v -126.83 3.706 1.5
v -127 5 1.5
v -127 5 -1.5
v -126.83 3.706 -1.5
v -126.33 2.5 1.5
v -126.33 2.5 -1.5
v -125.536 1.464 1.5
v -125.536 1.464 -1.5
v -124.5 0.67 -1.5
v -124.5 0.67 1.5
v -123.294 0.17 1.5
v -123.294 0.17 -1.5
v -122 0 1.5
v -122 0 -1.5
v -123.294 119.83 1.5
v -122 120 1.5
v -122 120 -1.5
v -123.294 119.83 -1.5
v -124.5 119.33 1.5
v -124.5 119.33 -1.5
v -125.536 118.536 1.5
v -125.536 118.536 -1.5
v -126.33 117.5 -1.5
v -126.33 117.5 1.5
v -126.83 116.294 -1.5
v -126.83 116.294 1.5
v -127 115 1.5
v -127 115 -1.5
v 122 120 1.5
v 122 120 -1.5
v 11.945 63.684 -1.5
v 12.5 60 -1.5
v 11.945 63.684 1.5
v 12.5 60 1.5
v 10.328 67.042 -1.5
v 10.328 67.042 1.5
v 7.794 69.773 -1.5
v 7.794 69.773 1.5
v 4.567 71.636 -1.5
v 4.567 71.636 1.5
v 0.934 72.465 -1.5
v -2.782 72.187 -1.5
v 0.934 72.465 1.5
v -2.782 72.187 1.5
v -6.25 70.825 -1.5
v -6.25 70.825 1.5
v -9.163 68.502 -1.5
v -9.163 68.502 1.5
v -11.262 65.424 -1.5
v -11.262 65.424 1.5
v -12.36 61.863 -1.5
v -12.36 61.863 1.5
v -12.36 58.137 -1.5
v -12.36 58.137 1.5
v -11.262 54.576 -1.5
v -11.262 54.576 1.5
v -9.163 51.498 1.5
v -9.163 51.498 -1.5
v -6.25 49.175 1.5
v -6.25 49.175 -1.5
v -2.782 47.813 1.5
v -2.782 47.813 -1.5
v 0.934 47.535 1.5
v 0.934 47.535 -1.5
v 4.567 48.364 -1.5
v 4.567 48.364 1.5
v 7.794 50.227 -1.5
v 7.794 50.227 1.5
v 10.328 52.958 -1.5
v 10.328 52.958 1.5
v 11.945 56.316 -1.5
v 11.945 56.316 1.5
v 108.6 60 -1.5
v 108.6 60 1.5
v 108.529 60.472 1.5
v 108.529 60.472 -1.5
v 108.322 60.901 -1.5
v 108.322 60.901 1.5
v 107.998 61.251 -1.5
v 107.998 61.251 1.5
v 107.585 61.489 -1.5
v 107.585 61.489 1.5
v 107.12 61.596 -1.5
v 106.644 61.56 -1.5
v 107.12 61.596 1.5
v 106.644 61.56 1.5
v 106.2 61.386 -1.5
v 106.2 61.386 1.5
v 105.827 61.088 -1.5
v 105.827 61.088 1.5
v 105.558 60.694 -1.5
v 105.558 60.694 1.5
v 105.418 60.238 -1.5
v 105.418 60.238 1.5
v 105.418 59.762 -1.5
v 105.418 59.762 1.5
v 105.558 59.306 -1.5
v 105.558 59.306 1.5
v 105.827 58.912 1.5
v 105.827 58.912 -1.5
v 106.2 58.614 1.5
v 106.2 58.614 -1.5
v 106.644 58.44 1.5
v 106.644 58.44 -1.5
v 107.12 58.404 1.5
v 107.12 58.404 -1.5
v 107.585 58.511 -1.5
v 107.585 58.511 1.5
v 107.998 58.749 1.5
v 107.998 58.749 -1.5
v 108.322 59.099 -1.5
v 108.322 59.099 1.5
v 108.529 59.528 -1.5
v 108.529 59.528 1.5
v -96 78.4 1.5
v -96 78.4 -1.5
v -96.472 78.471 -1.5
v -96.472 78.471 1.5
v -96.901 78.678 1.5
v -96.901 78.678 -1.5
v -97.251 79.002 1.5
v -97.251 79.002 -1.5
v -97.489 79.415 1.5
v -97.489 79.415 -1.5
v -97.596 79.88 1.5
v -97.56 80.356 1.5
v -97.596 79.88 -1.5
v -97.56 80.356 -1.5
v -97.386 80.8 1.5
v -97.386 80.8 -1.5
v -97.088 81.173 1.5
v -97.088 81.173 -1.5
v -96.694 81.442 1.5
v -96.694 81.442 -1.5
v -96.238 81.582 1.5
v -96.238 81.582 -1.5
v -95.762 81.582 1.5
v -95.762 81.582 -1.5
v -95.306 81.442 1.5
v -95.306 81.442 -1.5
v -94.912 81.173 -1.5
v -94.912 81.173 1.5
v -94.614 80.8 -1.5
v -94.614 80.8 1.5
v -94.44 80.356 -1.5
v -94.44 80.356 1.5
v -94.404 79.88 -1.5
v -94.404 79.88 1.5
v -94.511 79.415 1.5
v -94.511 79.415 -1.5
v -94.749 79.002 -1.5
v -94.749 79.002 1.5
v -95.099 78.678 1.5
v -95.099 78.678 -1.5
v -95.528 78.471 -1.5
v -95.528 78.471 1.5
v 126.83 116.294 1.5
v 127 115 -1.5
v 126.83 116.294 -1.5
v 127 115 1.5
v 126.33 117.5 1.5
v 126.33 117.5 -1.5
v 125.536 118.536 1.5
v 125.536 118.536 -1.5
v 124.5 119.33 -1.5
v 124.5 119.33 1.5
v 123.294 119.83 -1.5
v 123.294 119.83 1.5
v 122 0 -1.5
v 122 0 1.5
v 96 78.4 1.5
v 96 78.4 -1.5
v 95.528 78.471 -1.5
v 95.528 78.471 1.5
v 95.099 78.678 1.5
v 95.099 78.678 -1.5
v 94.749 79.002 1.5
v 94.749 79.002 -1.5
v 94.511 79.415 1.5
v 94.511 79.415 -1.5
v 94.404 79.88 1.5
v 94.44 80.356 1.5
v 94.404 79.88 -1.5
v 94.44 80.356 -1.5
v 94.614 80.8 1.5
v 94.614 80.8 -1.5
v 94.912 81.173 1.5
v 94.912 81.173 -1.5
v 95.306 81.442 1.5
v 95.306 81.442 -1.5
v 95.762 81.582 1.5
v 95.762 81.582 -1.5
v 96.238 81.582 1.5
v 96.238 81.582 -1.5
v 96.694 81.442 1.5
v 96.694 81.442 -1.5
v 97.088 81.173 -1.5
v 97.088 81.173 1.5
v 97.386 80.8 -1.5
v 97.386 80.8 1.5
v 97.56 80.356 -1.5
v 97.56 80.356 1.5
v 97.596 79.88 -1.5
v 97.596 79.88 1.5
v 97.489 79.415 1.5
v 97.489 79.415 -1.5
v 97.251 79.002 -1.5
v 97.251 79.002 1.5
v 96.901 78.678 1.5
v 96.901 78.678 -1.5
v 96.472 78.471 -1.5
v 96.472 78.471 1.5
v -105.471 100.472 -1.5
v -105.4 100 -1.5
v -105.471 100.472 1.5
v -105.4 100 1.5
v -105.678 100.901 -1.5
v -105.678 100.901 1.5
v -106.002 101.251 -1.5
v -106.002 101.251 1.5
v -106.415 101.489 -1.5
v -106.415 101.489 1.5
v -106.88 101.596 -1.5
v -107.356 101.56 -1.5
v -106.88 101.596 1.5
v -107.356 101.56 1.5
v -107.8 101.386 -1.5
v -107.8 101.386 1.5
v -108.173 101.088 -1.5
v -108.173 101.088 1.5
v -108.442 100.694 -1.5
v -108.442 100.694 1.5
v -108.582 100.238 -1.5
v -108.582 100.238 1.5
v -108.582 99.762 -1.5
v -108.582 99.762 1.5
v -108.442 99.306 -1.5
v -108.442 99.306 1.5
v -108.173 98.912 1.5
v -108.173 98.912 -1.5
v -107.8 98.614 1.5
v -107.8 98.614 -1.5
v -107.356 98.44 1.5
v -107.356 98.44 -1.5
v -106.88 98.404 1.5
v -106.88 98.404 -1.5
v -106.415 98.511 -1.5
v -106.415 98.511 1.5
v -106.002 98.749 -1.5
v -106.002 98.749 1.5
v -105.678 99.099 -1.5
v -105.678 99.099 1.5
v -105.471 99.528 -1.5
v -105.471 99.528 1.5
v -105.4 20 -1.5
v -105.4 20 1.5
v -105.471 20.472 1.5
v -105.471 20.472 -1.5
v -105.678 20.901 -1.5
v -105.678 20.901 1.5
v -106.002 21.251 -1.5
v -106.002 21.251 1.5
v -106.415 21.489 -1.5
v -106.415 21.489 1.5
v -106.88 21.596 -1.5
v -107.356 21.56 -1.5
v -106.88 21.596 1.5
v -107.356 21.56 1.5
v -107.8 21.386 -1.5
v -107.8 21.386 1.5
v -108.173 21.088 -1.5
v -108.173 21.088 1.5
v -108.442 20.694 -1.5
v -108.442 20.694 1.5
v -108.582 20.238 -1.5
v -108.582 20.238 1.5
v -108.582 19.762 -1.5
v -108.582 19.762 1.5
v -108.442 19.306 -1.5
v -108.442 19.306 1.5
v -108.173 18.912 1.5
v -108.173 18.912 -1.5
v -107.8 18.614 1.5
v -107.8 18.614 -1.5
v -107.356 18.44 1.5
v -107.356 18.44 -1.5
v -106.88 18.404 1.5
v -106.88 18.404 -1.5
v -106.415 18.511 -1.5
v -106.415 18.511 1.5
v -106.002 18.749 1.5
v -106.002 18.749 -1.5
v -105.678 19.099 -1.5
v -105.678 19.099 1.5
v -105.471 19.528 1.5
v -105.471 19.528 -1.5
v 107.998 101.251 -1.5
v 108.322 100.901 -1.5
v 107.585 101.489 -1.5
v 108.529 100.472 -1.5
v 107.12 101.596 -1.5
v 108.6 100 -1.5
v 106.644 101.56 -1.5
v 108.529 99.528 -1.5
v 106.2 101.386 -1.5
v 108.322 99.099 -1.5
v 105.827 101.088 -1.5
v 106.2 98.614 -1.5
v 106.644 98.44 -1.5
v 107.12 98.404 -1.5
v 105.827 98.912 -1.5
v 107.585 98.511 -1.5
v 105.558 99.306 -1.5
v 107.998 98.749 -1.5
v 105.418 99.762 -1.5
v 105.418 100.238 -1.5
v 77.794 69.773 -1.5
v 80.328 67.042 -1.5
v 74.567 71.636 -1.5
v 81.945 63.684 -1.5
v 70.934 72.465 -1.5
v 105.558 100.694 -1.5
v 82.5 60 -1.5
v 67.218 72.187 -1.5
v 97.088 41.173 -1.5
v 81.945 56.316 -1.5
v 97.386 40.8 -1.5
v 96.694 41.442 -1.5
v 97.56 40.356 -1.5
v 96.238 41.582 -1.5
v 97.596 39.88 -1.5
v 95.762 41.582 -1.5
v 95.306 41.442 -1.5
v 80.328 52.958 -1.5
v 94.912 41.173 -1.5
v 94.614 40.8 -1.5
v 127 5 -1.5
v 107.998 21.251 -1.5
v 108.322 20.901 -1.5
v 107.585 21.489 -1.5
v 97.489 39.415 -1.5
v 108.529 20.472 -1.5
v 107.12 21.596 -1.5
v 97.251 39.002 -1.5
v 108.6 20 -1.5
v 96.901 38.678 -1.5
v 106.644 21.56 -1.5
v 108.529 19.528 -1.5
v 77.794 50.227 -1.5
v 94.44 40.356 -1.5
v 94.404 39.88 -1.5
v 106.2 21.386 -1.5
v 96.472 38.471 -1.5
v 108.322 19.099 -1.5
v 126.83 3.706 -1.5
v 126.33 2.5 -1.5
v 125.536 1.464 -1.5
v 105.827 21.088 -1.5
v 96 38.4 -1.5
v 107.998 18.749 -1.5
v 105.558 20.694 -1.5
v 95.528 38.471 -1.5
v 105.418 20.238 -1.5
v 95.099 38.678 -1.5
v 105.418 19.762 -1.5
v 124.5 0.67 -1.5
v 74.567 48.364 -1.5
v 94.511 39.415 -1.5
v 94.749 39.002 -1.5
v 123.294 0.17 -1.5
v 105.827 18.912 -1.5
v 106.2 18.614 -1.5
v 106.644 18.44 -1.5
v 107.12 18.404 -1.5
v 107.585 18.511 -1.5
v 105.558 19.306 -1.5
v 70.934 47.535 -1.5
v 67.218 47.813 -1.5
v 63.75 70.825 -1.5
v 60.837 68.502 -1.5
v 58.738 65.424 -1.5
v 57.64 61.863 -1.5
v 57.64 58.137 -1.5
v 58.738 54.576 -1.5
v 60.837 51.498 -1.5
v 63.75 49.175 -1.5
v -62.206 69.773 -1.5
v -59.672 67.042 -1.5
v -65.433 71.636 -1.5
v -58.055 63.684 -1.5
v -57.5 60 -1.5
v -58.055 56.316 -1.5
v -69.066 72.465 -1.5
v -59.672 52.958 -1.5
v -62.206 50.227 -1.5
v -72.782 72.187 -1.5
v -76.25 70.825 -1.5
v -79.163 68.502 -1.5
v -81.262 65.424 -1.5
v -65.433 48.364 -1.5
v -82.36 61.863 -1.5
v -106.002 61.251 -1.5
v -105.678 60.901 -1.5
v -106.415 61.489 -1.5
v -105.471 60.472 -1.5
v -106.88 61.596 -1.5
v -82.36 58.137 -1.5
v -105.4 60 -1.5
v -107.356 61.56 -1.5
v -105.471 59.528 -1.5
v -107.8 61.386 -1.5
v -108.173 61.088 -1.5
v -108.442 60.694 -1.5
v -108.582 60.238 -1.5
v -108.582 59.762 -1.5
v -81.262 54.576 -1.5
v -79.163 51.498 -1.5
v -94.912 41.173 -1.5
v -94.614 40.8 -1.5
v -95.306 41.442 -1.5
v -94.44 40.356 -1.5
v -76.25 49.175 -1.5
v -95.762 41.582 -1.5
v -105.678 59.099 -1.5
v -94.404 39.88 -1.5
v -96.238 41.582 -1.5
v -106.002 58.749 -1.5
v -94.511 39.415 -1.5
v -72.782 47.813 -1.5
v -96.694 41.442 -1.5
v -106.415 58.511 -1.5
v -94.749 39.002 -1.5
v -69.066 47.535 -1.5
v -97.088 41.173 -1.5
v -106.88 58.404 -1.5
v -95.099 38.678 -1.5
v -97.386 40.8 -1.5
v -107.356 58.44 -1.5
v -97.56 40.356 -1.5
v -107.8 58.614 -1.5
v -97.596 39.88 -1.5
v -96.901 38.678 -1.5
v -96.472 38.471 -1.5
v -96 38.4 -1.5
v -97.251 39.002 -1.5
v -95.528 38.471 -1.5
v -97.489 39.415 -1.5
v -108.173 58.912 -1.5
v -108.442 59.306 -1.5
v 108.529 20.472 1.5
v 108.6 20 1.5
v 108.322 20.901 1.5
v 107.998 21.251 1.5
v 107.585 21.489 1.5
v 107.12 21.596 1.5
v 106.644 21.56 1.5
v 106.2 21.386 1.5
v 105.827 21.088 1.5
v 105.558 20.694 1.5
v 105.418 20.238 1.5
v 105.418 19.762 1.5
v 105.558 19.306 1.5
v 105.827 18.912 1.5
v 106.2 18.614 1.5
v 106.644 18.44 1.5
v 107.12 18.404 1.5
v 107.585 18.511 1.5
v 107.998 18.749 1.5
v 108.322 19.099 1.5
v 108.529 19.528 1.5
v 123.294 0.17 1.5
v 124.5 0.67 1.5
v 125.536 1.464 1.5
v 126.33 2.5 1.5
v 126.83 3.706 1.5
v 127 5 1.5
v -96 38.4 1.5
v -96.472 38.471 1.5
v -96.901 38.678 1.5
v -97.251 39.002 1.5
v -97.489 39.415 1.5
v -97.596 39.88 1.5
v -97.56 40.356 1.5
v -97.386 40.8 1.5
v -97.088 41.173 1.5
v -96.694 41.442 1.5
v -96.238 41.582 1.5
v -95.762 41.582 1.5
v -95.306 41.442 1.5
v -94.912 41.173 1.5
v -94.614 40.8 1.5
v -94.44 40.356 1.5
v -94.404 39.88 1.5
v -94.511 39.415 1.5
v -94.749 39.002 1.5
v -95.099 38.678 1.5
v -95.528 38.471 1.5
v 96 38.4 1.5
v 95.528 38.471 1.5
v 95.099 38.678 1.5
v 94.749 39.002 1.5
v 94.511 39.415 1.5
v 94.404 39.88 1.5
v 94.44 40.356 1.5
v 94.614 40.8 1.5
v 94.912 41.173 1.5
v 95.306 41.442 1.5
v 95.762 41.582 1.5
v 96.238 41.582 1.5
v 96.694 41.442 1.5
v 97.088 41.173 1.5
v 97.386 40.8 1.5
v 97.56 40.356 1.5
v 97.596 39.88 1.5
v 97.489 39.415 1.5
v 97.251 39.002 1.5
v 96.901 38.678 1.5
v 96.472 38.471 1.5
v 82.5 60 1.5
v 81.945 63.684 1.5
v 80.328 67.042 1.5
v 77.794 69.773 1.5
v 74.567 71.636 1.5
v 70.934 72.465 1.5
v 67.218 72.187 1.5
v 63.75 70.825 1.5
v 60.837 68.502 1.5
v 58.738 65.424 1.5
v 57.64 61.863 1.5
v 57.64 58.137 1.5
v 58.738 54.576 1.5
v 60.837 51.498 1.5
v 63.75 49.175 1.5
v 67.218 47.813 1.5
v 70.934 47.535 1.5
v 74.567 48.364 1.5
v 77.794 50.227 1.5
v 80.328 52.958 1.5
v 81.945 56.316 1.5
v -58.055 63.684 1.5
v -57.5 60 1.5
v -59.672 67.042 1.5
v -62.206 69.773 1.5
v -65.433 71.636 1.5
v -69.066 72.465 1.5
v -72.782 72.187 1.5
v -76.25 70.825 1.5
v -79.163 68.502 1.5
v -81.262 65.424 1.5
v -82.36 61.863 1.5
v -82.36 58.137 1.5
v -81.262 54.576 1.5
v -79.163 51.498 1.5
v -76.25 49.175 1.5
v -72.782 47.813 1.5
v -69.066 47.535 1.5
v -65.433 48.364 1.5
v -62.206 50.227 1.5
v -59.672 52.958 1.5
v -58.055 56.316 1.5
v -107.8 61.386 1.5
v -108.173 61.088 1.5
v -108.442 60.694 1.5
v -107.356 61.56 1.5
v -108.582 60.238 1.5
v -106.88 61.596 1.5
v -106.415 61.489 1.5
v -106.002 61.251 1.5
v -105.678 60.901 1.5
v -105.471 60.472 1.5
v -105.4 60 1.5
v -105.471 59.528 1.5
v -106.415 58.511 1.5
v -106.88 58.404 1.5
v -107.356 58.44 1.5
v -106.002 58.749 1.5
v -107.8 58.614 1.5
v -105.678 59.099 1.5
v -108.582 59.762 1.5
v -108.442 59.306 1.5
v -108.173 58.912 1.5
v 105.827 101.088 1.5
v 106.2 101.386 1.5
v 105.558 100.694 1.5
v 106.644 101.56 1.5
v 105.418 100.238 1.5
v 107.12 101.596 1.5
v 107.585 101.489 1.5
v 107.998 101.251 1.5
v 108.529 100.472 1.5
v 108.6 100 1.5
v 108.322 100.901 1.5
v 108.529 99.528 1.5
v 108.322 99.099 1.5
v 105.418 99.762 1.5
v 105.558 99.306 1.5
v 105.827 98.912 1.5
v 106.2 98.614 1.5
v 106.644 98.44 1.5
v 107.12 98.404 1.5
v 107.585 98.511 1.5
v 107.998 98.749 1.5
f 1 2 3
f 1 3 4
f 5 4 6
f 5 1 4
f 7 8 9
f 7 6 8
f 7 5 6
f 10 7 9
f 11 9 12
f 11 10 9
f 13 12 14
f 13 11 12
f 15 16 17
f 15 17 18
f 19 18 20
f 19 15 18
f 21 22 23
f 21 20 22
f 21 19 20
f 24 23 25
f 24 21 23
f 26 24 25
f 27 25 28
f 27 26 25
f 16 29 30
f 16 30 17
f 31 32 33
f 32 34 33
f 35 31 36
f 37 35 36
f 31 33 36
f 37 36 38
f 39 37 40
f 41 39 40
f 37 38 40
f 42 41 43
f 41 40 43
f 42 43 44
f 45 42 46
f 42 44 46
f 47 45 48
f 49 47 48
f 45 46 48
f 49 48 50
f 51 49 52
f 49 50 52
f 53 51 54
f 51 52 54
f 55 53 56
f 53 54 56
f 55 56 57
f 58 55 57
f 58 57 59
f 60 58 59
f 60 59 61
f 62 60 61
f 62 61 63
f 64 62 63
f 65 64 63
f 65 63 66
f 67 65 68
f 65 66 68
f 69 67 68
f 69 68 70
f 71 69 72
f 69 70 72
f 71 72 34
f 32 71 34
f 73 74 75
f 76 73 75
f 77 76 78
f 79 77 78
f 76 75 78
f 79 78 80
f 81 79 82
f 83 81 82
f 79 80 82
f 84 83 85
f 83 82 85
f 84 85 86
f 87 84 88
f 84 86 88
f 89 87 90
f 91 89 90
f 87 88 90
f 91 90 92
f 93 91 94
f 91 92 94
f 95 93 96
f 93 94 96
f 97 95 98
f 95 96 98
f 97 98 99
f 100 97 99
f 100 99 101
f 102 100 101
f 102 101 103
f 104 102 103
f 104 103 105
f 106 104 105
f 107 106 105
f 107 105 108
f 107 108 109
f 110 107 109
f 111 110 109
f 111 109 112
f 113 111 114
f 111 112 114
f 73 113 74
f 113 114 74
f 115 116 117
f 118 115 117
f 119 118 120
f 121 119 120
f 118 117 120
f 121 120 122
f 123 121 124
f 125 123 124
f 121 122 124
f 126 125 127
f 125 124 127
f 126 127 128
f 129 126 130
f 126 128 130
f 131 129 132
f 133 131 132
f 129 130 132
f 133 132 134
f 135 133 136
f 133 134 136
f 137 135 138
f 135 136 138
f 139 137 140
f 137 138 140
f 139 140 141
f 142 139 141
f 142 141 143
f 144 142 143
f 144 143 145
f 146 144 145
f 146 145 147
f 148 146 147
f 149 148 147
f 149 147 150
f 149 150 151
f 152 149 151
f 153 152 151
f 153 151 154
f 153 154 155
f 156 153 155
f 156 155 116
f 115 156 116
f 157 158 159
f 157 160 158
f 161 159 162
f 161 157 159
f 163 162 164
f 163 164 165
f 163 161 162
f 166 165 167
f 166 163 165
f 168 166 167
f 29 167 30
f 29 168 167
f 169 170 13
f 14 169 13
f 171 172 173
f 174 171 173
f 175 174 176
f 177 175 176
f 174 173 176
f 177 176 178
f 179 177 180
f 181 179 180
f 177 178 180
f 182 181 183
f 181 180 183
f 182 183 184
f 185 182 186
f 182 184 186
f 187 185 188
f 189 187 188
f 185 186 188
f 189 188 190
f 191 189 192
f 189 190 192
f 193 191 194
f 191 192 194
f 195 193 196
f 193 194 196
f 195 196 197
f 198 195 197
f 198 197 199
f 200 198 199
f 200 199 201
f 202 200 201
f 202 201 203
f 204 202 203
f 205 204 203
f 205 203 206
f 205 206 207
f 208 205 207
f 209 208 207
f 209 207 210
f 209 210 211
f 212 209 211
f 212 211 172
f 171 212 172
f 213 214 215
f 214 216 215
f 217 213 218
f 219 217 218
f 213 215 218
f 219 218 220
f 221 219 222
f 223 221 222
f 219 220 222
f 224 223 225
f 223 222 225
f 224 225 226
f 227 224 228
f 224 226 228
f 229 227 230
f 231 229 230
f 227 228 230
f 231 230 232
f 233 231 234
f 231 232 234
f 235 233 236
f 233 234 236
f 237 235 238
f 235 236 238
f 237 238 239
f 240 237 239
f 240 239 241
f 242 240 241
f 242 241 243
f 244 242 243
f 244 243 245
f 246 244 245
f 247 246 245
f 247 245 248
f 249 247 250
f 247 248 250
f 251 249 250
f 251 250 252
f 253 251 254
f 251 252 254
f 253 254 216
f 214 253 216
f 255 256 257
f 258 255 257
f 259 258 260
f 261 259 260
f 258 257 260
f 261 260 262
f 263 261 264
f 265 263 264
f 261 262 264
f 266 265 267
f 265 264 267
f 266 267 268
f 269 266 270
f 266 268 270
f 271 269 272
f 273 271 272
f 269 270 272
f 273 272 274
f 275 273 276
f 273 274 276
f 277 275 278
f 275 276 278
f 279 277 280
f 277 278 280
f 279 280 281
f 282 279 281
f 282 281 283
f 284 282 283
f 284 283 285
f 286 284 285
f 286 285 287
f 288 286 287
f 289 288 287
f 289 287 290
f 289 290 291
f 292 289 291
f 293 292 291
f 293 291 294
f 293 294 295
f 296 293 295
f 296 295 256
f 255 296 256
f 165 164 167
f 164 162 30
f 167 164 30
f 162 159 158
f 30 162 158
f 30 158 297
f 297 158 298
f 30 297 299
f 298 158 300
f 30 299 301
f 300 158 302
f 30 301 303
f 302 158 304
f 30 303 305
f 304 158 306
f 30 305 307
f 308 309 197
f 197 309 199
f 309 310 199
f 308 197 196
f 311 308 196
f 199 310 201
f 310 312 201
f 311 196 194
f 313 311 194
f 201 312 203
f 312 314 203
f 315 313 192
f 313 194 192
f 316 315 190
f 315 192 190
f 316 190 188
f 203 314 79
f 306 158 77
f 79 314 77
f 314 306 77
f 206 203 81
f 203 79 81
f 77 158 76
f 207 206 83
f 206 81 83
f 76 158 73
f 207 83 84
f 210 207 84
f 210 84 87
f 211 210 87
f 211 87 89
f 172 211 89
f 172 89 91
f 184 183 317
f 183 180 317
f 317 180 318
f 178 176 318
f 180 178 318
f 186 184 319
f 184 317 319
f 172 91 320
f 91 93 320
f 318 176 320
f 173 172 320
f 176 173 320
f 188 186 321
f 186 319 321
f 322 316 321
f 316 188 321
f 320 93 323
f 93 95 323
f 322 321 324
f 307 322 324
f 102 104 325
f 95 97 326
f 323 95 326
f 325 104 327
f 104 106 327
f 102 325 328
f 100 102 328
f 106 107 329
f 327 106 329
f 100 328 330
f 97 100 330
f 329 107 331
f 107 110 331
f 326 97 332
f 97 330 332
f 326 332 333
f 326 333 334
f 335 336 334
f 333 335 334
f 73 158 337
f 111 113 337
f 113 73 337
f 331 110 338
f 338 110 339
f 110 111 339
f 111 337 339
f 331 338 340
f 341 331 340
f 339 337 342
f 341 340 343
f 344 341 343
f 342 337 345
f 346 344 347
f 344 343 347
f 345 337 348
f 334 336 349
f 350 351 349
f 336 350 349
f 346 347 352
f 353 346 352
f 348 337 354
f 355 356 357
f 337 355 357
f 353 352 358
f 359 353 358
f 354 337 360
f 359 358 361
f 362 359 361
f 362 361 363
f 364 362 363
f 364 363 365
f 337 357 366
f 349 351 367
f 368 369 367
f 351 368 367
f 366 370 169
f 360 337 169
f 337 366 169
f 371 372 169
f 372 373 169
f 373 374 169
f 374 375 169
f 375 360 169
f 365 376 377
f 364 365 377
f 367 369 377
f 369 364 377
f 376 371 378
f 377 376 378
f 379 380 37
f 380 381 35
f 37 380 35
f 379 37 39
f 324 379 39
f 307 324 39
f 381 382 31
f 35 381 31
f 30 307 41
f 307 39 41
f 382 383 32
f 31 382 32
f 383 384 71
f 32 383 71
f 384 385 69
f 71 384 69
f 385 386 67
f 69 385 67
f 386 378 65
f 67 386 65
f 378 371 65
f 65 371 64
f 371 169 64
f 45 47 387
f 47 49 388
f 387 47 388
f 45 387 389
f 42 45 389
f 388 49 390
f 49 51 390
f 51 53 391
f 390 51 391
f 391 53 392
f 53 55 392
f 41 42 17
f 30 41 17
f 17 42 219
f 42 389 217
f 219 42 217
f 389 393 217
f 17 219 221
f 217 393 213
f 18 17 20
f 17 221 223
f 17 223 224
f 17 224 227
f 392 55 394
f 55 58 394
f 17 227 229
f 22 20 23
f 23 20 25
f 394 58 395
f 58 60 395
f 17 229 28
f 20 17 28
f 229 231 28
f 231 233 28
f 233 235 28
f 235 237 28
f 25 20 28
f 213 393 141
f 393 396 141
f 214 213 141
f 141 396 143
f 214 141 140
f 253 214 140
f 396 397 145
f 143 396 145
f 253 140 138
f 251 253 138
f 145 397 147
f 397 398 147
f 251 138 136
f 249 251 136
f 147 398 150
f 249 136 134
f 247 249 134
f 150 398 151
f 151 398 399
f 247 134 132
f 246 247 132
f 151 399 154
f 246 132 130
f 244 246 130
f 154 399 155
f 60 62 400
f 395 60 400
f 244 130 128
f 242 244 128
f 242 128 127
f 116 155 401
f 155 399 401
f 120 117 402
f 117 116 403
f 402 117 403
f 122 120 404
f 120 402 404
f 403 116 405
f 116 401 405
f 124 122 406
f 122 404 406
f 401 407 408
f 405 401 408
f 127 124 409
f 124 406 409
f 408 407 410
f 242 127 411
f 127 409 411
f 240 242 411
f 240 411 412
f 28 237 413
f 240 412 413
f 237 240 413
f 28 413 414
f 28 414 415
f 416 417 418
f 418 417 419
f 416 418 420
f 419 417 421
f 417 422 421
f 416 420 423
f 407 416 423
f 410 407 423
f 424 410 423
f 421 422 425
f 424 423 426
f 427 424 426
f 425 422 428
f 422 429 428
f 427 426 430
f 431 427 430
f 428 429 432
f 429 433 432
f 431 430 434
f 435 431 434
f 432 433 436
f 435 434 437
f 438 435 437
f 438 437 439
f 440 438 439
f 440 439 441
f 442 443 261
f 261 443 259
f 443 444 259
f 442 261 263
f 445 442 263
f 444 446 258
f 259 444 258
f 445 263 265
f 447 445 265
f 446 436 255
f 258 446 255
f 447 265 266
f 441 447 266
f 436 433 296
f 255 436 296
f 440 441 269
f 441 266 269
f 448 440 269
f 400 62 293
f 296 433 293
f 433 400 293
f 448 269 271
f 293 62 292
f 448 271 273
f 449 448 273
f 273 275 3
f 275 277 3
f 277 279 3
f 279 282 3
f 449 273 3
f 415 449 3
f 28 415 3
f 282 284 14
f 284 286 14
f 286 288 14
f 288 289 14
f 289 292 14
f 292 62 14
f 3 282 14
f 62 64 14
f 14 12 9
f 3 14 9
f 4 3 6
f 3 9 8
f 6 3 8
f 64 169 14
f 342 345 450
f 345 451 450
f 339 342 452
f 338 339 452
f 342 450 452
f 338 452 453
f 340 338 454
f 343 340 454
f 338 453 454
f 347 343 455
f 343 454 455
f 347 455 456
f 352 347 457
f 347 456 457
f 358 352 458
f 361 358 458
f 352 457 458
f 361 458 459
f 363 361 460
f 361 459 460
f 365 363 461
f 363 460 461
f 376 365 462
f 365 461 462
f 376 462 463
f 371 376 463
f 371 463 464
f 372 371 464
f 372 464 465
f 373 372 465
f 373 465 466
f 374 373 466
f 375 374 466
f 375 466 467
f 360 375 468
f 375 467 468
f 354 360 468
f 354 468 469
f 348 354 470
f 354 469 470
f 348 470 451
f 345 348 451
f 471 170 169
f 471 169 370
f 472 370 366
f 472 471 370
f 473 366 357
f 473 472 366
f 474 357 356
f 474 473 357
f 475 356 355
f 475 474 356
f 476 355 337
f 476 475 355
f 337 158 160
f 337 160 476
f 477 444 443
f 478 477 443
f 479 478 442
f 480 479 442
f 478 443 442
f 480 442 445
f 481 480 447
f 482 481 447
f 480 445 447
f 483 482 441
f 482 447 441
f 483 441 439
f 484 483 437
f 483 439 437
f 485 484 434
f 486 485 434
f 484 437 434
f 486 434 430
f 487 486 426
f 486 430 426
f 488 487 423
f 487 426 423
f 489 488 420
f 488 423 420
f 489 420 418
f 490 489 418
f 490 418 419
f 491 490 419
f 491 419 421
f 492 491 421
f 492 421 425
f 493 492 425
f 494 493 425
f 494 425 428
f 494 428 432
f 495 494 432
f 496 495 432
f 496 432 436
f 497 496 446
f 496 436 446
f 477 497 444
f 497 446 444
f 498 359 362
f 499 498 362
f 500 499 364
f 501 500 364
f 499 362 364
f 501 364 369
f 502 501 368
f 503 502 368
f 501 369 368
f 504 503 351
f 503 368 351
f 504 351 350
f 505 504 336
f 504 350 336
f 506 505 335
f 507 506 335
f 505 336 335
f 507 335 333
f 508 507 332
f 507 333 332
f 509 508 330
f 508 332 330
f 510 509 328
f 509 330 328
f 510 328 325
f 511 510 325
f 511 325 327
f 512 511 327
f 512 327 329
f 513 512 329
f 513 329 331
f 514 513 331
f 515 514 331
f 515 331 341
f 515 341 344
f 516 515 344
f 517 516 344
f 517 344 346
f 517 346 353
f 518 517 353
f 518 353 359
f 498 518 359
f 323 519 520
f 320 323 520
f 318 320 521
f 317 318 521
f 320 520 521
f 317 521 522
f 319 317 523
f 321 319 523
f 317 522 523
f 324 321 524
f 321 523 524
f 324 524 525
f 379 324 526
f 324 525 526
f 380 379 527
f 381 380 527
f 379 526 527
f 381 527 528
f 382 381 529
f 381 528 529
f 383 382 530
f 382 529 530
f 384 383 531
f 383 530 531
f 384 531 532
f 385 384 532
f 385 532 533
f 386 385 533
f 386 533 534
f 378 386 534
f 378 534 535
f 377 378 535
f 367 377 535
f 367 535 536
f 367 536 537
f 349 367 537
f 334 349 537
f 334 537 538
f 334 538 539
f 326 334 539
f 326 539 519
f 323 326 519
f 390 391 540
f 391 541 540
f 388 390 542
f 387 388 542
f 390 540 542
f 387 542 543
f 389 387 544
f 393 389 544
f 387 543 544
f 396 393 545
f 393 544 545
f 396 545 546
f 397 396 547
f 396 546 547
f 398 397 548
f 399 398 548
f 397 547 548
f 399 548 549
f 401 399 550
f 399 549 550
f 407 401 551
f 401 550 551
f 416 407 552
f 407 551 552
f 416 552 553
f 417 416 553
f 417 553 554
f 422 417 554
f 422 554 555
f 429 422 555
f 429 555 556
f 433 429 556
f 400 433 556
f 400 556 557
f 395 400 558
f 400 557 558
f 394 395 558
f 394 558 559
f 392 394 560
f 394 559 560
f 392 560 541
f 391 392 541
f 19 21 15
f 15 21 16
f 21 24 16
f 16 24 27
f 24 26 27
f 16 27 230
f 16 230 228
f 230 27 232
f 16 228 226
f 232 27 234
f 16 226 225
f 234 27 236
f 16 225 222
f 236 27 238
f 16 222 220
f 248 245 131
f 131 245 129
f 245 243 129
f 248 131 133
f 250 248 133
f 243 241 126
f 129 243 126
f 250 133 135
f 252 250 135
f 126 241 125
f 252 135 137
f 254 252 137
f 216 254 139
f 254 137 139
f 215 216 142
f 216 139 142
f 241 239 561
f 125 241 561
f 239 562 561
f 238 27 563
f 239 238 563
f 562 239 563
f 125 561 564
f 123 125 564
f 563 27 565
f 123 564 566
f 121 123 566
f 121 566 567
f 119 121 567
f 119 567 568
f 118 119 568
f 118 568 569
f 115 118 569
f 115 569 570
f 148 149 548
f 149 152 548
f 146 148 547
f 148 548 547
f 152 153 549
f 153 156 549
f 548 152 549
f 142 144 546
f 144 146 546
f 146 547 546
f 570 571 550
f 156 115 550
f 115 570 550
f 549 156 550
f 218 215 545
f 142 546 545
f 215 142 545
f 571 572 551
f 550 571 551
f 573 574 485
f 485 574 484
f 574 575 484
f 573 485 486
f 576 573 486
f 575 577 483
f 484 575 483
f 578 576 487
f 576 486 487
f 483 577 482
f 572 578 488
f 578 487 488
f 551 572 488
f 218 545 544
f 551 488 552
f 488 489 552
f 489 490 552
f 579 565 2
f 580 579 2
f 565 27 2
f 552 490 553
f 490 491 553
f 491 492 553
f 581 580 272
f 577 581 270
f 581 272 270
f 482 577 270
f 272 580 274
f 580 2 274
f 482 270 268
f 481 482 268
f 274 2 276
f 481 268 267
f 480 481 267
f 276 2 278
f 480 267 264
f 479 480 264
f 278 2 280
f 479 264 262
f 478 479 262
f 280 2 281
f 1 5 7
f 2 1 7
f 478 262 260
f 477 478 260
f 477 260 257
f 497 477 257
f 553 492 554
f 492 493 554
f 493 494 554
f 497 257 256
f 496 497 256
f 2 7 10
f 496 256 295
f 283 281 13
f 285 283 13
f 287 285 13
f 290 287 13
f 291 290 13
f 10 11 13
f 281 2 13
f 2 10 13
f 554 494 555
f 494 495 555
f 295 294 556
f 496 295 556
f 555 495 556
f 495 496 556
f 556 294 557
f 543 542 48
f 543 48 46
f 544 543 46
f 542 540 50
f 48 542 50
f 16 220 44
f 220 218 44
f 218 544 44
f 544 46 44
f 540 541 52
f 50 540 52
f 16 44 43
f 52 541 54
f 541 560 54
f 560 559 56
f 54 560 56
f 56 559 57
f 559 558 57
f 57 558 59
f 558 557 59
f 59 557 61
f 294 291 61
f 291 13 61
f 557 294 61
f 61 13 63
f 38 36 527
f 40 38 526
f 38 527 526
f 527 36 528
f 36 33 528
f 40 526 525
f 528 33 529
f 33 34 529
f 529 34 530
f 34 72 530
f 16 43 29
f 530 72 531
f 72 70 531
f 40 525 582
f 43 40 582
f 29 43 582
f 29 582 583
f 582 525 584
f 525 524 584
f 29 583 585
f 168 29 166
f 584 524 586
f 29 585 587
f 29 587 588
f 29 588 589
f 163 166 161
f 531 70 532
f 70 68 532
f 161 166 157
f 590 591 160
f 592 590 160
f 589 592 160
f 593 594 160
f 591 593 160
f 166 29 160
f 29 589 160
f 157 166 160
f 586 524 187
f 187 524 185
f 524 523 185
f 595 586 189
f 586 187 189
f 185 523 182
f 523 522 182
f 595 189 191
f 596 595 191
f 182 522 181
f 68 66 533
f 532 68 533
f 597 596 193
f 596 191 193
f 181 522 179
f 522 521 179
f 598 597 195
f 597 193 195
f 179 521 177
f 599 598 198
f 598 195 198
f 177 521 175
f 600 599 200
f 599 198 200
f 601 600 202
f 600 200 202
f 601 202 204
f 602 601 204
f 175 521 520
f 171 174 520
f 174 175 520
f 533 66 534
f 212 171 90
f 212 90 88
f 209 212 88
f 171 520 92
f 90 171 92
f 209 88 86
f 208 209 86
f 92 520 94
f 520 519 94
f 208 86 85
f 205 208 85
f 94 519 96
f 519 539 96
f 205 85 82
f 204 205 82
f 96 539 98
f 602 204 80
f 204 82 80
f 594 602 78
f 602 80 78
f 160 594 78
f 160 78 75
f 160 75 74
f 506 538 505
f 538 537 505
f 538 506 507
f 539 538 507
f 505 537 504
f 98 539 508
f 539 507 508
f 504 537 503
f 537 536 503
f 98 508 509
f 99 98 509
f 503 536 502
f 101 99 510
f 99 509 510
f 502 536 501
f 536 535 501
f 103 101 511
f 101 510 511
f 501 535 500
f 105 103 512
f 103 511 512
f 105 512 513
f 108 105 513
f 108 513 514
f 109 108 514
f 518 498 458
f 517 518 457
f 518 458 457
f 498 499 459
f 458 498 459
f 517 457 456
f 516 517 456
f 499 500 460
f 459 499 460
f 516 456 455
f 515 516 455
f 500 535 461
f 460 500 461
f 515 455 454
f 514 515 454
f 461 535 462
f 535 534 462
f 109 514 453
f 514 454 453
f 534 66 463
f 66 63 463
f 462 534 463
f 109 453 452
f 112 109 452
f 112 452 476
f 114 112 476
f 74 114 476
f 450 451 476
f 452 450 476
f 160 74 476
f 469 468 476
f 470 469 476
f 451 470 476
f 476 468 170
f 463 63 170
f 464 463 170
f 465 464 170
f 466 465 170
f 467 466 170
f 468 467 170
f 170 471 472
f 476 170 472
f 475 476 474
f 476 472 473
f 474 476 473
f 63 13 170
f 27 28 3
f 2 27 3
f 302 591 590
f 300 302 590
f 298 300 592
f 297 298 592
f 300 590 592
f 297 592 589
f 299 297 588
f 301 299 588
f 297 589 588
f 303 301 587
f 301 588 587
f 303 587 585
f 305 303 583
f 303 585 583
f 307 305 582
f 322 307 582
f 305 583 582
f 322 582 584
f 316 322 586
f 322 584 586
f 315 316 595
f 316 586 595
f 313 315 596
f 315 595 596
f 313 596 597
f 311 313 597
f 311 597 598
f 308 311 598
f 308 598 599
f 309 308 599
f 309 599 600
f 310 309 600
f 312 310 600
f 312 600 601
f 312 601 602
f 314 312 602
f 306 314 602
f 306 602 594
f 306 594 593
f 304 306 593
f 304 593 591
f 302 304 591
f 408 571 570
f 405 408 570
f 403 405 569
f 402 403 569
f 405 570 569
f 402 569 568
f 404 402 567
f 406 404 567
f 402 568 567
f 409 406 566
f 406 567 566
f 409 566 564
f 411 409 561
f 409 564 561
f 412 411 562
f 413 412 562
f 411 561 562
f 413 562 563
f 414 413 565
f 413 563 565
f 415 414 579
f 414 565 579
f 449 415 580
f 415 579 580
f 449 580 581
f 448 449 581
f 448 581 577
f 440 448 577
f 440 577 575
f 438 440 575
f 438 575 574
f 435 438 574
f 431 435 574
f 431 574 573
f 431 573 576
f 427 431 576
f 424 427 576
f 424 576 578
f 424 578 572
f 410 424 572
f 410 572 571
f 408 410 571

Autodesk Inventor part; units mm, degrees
ref_plane "YZ Plane" through (0, 0, 0) normal (1, 0, 0) x (0, 1, 0)
ref_plane "XZ Plane" through (0, 0, 0) normal (0, 1, 0) x (-1, 0, 0)
ref_plane "XY Plane" through (0, 0, 0) normal (0, 0, 1) x (1, 0, 0)
sketch "スケッチ1" plane through (0, 0, 0) normal (0, 1, 0) x (-1, 0, 0)
  line L0 (130, 1.5) -> (-130, 1.5)
  line L1 (-130, 1.5) -> (-130, -1.5)
  line L2 (-130, -1.5) -> (130, -1.5)
  line L3 (130, -1.5) -> (130, 1.5)
  line L4 (130, 1.5) -> (-130, -1.5) construction
  line L5 (-130, 1.5) -> (130, -1.5) construction
  point P0 (0, 0)
  dimension "d0" = 260
  dimension "d1" = 3
extrude "押し出し1" add sketch "スケッチ1" along normal blind 120
sketch "スケッチ3" plane through (-130, 0, 1.5) normal (0, 0, 1) x (1, 0, 0)
  circle A0 centre (60, 60) radius 12.5
  circle A1 centre (130, 60) radius 12.5
  circle A2 centre (200, 60) radius 12.5
  line L0 (0, 0) -> (0, 120) projected
  line L1 (260, 0) -> (260, 120) projected
  point P0 (130, 0)
  point P1 (0, 60)
  point P2 (260, 60)
  dimension "d10" = 25
  dimension "d11" = 25
  dimension "d12" = 25
  dimension "d15" = 60
  dimension "d16" = 60
  dimension "d18" = 0
  dimension "d21" = 0
  dimension "d71" = 0
  dimension "d72" = 70
extrude "押し出し3" cut sketch "スケッチ3" against normal through all
sketch "スケッチ5" plane through (130, 0, -1.5) normal (0, 0, -1) x (-1, 0, 0)
  line L0 (0, 0) -> (260, 0) projected
  line L1 (0, 120) -> (3, 120)
  line L2 (3, 120) -> (3, 0)
  line L3 (3, 0) -> (0, 0)
  line L4 (0, 0) -> (0, 120)
  line L5 (0, 105) -> (3, 105)
  line L6 (3, 105) -> (3, 15)
  line L7 (3, 15) -> (0, 15)
  line L8 (0, 15) -> (0, 105)
  line L9 (0, 120) -> (260, 120) projected
  line L10 (130, 120) -> (130, 0)
  line L11 (260, 0) -> (0, 0)
  line L12 (260, 120) -> (257, 120)
  line L13 (257, 120) -> (257, 0)
  line L14 (260, 0) -> (260, 120)
  line L15 (260, 105) -> (257, 105)
  line L16 (257, 15) -> (260, 15)
  point P0 (1.5, 105)
  point P1 (1.5, 120)
  point P2 (1.5, 15)
  point P3 (1.5, 0)
  point P4 (258.5, 15)
  point P5 (257, 0)
  point P6 (257, 120)
  point P7 (0, 15)
  point P8 (3, 105)
  dimension "d22" = 3
  dimension "d23" = 15
  dimension "d24" = 15
extrude "押し出し4" cut sketch "スケッチ5" against normal through all contours L4 L7 L2 L0 | L4 L5 L2 L7 | L4 L1 L2 L5 | L13 L16 L14 L0 | L13 L15 L14 L16 | L9 L14 L15 L13
sketch "スケッチ8" plane through (-127, 0, 1.5) normal (0, 0, 1) x (1, 0, 0)
  circle A0 centre (20, 100) radius 1.6
  circle A1 centre (20, 20) radius 1.6
  line L0 (0, 120) -> (0, 0) projected
  line L1 (0, 120) -> (254, 120) projected
  line L2 (0, 0) -> (254, 0) projected
  line L3 (127, 120) -> (127, 0)
  circle A2 centre (234, 100) radius 1.6
  circle A3 centre (234, 20) radius 1.6
  circle A4 centre (20, 60) radius 1.6
  circle A5 centre (234, 60) radius 1.6
  dimension "d31" = 20
  dimension "d32" = 20
  dimension "d33" = 20
  dimension "d34" = 20
  dimension "d35" = 3.2
  dimension "d36" = 3.2
  dimension "d73" = 3.2
  dimension "d74" = 40
  dimension "d75" = 20
extrude "押し出し7" cut sketch "スケッチ8" against normal through all contours A0 | A1 | A2 | A3 | A4 | A5
fillet "フィレット1" radius 5 4 edges at (-127, 120, 0) (-127, 0, 0) (127, 120, 0) (127, 0, 0)
sketch "スケッチ13" plane through (-122, 0, 1.5) normal (0, 0, 1) x (1, 0, 0)
  line L0 (244, 120) -> (0, 120) projected
  line L1 (122, 120) -> (122, 0)
  circle A0 centre (15, 110) radius 1.6 projected
  circle A1 centre (15, 10) radius 1.6 projected
  circle A2 centre (15, 60) radius 1.6 projected
  circle A3 centre (122, 60) radius 12.5 projected
  line L2 (122, 60) -> (122, 88.3789)
  point P0 (26, 80)
  point P1 (26, 40)
  point P2 (218, 80)
  point P3 (218, 40)
  dimension "d76" = 11
  dimension "d77" = 40
  dimension "d78" = 20
  dimension "d79" = 11
hole "穴1" at (-96, 80, 1.5) at (-96, 40, 1.5) at (96, 40, 1.5) at (96, 80, 1.5) direction (0, 0, -1) diameter 3.2 end through all
equation "\"d36\" = d35"
equation "\"d73\" = d35"
equation "\"d78\" = 0.5 * d77"
properties part number "BP_BOX-Front-120" material "アセタール樹脂、白"
